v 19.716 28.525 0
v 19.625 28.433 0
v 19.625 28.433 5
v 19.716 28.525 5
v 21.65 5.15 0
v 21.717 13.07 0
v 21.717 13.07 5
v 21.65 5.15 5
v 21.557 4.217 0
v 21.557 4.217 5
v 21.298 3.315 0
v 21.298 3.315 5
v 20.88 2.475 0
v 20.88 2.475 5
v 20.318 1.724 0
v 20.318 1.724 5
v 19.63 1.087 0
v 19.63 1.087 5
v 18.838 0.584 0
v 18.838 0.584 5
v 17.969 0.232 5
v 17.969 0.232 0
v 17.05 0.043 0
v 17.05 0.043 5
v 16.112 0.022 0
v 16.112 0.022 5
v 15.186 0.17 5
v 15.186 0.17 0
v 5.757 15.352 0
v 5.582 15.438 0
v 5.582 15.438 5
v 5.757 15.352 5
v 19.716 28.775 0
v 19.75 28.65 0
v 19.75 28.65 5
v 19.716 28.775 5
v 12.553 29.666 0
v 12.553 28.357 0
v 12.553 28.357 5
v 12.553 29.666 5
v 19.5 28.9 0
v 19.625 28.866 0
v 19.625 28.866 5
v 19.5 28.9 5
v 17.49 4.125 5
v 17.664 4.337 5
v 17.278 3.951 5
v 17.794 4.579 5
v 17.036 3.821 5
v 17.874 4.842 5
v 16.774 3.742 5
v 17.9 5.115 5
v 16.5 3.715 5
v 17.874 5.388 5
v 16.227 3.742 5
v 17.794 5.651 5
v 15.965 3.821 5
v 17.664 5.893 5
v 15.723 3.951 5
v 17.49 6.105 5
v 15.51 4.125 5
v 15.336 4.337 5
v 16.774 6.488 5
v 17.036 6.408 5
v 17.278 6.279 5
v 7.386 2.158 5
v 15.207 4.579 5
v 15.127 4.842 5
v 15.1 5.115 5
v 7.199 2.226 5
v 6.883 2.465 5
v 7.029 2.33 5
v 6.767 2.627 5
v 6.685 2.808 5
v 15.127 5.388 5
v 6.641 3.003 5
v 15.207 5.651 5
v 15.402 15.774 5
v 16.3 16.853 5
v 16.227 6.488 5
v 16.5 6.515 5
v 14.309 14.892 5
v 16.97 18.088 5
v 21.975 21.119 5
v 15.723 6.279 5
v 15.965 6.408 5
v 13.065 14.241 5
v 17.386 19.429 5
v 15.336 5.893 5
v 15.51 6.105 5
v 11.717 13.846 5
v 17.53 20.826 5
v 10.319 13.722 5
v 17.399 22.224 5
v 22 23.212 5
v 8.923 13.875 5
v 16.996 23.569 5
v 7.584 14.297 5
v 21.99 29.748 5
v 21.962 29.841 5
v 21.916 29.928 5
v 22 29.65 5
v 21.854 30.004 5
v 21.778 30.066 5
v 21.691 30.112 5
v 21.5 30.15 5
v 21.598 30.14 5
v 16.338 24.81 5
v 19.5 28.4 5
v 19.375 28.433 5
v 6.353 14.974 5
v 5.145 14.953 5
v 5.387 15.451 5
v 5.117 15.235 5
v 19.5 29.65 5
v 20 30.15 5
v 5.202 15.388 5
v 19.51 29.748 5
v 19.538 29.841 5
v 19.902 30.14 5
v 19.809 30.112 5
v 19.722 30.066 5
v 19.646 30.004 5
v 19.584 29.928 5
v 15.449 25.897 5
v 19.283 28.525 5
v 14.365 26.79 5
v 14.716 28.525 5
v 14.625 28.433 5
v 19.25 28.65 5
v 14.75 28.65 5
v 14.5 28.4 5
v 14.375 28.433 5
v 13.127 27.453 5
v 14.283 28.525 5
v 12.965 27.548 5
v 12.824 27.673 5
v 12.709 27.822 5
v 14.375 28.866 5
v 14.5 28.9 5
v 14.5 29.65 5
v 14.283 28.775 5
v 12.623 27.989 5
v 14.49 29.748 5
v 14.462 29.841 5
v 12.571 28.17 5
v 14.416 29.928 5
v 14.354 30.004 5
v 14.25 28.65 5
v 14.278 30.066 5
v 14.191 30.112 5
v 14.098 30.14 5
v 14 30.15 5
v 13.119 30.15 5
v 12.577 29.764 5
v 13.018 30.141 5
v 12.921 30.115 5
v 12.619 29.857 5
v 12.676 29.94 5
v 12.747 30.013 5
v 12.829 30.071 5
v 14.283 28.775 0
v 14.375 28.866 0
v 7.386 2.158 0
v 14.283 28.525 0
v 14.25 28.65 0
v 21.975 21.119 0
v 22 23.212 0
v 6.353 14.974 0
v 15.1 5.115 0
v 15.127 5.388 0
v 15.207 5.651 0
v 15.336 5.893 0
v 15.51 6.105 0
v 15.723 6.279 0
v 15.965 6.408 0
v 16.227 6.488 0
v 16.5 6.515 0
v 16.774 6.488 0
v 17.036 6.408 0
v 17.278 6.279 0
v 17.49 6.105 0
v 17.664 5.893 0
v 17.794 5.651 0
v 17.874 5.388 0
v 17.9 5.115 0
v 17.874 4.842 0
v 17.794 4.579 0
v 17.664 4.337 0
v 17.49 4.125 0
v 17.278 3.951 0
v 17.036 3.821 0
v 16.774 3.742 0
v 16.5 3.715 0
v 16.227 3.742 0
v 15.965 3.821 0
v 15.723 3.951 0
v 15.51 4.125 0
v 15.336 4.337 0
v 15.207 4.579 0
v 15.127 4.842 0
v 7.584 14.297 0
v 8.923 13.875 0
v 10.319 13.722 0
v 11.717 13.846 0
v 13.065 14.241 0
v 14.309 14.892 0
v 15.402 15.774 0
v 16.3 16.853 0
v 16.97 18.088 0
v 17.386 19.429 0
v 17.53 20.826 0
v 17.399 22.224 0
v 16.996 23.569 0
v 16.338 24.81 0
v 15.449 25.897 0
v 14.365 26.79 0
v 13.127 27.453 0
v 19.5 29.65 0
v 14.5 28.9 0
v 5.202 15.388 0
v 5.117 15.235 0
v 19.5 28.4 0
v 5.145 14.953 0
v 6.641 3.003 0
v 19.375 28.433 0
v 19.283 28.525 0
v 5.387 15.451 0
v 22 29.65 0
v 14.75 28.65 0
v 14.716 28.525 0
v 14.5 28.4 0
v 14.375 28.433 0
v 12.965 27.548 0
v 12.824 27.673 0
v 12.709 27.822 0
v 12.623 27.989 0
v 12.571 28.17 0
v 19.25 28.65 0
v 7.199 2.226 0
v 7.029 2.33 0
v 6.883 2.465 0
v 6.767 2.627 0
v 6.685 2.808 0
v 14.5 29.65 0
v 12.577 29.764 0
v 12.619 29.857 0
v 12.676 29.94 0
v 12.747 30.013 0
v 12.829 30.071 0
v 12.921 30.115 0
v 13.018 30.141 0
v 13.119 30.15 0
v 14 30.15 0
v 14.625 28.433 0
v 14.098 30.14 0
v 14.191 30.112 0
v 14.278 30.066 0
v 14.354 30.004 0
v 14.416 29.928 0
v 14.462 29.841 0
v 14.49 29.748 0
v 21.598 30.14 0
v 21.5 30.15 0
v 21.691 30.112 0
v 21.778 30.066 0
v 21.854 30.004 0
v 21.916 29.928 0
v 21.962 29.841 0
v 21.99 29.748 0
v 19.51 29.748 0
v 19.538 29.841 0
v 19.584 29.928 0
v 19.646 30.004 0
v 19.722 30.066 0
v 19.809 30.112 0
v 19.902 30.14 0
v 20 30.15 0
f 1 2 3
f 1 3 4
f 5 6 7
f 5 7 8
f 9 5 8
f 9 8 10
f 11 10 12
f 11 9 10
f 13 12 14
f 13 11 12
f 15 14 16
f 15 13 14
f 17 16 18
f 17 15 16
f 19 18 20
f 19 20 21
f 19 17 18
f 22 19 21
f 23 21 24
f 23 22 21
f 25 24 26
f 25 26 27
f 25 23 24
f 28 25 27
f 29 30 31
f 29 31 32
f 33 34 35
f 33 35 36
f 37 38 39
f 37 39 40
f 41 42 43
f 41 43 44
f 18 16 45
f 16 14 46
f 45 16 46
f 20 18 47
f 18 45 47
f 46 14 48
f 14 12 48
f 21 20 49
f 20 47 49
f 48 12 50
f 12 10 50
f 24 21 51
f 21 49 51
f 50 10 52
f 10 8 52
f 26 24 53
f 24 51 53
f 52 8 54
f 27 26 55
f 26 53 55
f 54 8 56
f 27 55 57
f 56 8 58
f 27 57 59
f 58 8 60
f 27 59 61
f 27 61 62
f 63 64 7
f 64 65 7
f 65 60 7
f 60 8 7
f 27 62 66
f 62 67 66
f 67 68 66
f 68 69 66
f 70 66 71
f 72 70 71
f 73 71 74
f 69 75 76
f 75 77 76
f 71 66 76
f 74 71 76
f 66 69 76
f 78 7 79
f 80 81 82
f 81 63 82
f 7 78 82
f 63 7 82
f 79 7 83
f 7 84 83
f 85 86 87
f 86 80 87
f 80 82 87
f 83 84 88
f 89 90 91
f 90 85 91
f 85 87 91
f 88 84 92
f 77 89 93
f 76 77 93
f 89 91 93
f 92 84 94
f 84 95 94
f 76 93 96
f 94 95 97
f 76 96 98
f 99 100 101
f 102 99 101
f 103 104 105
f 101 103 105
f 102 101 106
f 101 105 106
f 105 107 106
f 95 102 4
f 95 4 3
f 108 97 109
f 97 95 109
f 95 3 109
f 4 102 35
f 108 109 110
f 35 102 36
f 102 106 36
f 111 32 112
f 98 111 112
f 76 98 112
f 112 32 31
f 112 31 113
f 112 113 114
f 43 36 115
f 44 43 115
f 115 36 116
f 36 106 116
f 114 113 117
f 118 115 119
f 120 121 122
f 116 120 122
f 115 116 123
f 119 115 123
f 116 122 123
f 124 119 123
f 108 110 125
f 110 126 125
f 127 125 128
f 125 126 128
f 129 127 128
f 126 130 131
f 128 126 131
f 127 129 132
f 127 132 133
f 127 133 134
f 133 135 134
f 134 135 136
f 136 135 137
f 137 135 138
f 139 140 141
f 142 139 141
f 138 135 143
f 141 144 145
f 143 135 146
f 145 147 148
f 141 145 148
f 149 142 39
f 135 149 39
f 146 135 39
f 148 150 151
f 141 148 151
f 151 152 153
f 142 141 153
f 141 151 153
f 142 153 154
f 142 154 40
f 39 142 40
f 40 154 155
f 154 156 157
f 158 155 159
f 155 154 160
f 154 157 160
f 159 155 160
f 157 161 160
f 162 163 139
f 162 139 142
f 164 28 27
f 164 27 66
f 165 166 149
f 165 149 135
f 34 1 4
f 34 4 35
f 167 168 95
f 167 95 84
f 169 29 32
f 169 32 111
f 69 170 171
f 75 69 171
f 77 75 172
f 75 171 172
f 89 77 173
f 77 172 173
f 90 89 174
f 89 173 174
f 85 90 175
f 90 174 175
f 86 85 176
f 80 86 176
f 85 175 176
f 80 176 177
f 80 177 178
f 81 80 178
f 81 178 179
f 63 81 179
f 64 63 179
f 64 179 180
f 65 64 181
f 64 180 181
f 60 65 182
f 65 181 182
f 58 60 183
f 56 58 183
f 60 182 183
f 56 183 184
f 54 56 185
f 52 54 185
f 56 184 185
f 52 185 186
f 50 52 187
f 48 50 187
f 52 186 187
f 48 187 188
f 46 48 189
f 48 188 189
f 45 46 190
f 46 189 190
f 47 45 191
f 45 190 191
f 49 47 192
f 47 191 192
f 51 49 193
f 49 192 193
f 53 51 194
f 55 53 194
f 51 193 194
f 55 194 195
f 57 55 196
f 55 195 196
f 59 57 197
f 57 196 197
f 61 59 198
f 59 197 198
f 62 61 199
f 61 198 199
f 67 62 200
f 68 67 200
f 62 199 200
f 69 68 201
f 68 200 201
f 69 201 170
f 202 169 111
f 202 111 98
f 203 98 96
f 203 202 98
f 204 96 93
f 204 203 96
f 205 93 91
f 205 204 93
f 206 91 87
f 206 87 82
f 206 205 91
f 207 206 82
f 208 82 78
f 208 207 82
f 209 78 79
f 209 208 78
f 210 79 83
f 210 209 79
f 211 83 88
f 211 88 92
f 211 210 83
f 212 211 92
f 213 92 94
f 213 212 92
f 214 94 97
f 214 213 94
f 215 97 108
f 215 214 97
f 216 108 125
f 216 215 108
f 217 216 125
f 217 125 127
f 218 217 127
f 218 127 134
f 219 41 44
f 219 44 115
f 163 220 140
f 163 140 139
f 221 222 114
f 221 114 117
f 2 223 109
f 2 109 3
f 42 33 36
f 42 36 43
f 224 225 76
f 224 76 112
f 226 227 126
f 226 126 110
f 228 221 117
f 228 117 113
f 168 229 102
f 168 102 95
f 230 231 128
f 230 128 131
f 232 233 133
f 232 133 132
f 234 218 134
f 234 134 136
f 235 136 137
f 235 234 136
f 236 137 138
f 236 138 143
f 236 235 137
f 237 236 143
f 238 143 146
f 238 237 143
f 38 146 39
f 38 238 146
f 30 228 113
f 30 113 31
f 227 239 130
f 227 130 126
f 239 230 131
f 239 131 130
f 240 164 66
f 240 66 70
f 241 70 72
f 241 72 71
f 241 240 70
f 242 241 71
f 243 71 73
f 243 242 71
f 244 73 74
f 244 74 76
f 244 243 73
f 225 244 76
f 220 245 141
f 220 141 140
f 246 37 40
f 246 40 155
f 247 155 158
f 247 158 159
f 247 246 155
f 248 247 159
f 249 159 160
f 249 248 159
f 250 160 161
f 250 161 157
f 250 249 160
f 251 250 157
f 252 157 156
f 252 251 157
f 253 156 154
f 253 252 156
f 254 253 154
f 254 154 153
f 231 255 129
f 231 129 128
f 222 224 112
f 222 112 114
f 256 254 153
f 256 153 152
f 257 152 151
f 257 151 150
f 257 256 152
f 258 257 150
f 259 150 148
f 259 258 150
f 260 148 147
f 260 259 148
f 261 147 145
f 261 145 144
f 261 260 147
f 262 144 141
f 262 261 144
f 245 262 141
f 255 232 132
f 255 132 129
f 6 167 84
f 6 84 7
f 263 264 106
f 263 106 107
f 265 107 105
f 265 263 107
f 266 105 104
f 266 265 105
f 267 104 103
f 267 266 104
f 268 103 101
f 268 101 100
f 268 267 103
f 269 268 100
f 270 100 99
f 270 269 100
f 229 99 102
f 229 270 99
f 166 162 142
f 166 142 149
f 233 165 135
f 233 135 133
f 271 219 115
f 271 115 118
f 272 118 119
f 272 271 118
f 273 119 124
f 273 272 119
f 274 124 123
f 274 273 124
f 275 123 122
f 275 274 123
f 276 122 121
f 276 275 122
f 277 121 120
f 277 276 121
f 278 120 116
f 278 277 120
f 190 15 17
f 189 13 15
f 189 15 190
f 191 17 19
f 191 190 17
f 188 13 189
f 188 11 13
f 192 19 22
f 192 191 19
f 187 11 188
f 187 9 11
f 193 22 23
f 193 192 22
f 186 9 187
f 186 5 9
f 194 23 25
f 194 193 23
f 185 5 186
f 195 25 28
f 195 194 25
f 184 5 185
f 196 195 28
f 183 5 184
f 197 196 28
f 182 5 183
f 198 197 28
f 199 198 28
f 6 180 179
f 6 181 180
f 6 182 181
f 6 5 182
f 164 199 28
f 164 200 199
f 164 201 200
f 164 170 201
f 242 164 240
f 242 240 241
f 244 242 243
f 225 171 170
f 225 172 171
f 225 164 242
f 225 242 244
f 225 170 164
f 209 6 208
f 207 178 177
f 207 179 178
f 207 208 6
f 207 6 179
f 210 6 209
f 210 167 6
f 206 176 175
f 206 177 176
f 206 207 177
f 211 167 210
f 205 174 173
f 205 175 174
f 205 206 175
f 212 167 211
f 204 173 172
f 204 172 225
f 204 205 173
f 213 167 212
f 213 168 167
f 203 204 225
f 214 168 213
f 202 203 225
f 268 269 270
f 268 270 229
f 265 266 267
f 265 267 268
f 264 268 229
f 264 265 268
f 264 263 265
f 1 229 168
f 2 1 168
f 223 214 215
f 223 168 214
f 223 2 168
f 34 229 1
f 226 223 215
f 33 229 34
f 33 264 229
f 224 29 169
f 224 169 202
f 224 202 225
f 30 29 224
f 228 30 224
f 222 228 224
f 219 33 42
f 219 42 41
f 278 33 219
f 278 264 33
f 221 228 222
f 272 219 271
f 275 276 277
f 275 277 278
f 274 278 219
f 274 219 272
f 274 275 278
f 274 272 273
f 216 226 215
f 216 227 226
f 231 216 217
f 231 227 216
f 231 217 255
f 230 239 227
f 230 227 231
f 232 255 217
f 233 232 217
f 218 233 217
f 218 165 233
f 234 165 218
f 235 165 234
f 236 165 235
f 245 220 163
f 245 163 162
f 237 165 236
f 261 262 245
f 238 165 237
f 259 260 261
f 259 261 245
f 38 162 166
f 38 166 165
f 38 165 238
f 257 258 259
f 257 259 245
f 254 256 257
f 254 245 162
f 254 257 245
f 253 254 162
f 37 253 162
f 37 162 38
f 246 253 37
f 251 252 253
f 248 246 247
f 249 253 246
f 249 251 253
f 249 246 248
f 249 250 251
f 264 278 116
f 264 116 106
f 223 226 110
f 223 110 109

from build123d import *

# Parameters (mm, degrees)
ESQUISSE1_R        = 1.4
BOSS_EXTRU_1_DEPTH = 5


with BuildPart() as part:
    # Esquisse1 → Boss.-Extru.1 (new body)
    with BuildSketch(Plane(origin=(0, 0, 0), x_dir=(-1, 0, 0), z_dir=(0, 0, -1))):
        with BuildLine():
            Line((-15.185840881, 0.170296169), (-7.386227588, 2.157766419))
            ThreePointArc((-7.386227588, 2.157766419), (-6.883257057, 2.465245864), (-6.640893239, 3.002630961))
            Line((-6.640893239, 3.002630961), (-5.14541723, 14.953309043))
            Line((-5.14541723, 14.953309043), (-5.116713392, 15.234944478))
            Line((-5.116713392, 15.234944478), (-5.20171731, 15.387969012))
            Line((-5.20171731, 15.387969012), (-5.386870175, 15.451048966))
            Line((-5.386870175, 15.451048966), (-5.582053032, 15.438258975))
            Line((-5.582053032, 15.438258975), (-5.757396903, 15.351569039))
            Line((-5.757396903, 15.351569039), (-6.353216099, 14.974428283))
            ThreePointArc((-6.353216099, 14.974428283), (-16.665635969, 17.453925295), (-13.127159197, 27.452579762))
            ThreePointArc((-13.127159197, 27.452579762), (-12.708604135, 27.821584741), (-12.552929618, 28.357419099))
            Line((-12.552929618, 28.357419099), (-12.552929618, 29.66633814))
            ThreePointArc((-12.552929618, 29.66633814), (-12.746735333, 30.012603591), (-13.119010387, 30.149977907))
            Line((-13.119010387, 30.149977907), (-13.999989741, 30.149977907))
            ThreePointArc((-13.999989741, 30.149977907), (-14.353542873, 30.003531405), (-14.499989375, 29.649978273))
            Line((-14.499989375, 29.649978273), (-14.499989375, 28.899978823))
            Line((-14.499989375, 28.899978823), (-14.374989466, 28.866488848))
            Line((-14.374989466, 28.866488848), (-14.283479534, 28.774978915))
            Line((-14.283479534, 28.774978915), (-14.249989558, 28.649979006))
            Line((-14.249989558, 28.649979006), (-14.283479534, 28.524979098))
            Line((-14.283479534, 28.524979098), (-14.374989466, 28.433469165))
            Line((-14.374989466, 28.433469165), (-14.499989375, 28.399979189))
            Line((-14.499989375, 28.399979189), (-14.624989283, 28.433469165))
            Line((-14.624989283, 28.433469165), (-14.716499216, 28.524979098))
            Line((-14.716499216, 28.524979098), (-14.749989192, 28.649979006))
            Line((-14.749989192, 28.649979006), (-19.249985894, 28.649979006))
            Line((-19.249985894, 28.649979006), (-19.28347587, 28.524979098))
            Line((-19.28347587, 28.524979098), (-19.374985803, 28.433469165))
            Line((-19.374985803, 28.433469165), (-19.499985711, 28.399979189))
            Line((-19.499985711, 28.399979189), (-19.624985619, 28.433469165))
            Line((-19.624985619, 28.433469165), (-19.716495552, 28.524979098))
            Line((-19.716495552, 28.524979098), (-19.749985528, 28.649979006))
            Line((-19.749985528, 28.649979006), (-19.716495552, 28.774978915))
            Line((-19.716495552, 28.774978915), (-19.624985619, 28.866488848))
            Line((-19.624985619, 28.866488848), (-19.499985711, 28.899978823))
            Line((-19.499985711, 28.899978823), (-19.499985711, 29.649978273))
            ThreePointArc((-19.499985711, 29.649978273), (-19.646432213, 30.003531405), (-19.999985345, 30.149977907))
            Line((-19.999985345, 30.149977907), (-21.499984246, 30.149977907))
            ThreePointArc((-21.499984246, 30.149977907), (-21.853537377, 30.003531405), (-21.999983879, 29.649978273))
            Line((-21.999983879, 29.649978273), (-21.999983879, 23.212152991))
            Line((-21.999983879, 23.212152991), (-21.974503898, 21.118714525))
            Line((-21.974503898, 21.118714525), (-21.716894087, 13.069840423))
            Line((-21.716894087, 13.069840423), (-21.649985688, 5.150180005))
            ThreePointArc((-21.649985688, 5.150180005), (-19.62980681, 1.087138091), (-15.185840881, 0.170296169))
        make_face()
        with Locations((-16.500427031, 5.114893226)):
            Circle(ESQUISSE1_R, mode=Mode.SUBTRACT)
    extrude(amount=-BOSS_EXTRU_1_DEPTH)


solid = part.part
